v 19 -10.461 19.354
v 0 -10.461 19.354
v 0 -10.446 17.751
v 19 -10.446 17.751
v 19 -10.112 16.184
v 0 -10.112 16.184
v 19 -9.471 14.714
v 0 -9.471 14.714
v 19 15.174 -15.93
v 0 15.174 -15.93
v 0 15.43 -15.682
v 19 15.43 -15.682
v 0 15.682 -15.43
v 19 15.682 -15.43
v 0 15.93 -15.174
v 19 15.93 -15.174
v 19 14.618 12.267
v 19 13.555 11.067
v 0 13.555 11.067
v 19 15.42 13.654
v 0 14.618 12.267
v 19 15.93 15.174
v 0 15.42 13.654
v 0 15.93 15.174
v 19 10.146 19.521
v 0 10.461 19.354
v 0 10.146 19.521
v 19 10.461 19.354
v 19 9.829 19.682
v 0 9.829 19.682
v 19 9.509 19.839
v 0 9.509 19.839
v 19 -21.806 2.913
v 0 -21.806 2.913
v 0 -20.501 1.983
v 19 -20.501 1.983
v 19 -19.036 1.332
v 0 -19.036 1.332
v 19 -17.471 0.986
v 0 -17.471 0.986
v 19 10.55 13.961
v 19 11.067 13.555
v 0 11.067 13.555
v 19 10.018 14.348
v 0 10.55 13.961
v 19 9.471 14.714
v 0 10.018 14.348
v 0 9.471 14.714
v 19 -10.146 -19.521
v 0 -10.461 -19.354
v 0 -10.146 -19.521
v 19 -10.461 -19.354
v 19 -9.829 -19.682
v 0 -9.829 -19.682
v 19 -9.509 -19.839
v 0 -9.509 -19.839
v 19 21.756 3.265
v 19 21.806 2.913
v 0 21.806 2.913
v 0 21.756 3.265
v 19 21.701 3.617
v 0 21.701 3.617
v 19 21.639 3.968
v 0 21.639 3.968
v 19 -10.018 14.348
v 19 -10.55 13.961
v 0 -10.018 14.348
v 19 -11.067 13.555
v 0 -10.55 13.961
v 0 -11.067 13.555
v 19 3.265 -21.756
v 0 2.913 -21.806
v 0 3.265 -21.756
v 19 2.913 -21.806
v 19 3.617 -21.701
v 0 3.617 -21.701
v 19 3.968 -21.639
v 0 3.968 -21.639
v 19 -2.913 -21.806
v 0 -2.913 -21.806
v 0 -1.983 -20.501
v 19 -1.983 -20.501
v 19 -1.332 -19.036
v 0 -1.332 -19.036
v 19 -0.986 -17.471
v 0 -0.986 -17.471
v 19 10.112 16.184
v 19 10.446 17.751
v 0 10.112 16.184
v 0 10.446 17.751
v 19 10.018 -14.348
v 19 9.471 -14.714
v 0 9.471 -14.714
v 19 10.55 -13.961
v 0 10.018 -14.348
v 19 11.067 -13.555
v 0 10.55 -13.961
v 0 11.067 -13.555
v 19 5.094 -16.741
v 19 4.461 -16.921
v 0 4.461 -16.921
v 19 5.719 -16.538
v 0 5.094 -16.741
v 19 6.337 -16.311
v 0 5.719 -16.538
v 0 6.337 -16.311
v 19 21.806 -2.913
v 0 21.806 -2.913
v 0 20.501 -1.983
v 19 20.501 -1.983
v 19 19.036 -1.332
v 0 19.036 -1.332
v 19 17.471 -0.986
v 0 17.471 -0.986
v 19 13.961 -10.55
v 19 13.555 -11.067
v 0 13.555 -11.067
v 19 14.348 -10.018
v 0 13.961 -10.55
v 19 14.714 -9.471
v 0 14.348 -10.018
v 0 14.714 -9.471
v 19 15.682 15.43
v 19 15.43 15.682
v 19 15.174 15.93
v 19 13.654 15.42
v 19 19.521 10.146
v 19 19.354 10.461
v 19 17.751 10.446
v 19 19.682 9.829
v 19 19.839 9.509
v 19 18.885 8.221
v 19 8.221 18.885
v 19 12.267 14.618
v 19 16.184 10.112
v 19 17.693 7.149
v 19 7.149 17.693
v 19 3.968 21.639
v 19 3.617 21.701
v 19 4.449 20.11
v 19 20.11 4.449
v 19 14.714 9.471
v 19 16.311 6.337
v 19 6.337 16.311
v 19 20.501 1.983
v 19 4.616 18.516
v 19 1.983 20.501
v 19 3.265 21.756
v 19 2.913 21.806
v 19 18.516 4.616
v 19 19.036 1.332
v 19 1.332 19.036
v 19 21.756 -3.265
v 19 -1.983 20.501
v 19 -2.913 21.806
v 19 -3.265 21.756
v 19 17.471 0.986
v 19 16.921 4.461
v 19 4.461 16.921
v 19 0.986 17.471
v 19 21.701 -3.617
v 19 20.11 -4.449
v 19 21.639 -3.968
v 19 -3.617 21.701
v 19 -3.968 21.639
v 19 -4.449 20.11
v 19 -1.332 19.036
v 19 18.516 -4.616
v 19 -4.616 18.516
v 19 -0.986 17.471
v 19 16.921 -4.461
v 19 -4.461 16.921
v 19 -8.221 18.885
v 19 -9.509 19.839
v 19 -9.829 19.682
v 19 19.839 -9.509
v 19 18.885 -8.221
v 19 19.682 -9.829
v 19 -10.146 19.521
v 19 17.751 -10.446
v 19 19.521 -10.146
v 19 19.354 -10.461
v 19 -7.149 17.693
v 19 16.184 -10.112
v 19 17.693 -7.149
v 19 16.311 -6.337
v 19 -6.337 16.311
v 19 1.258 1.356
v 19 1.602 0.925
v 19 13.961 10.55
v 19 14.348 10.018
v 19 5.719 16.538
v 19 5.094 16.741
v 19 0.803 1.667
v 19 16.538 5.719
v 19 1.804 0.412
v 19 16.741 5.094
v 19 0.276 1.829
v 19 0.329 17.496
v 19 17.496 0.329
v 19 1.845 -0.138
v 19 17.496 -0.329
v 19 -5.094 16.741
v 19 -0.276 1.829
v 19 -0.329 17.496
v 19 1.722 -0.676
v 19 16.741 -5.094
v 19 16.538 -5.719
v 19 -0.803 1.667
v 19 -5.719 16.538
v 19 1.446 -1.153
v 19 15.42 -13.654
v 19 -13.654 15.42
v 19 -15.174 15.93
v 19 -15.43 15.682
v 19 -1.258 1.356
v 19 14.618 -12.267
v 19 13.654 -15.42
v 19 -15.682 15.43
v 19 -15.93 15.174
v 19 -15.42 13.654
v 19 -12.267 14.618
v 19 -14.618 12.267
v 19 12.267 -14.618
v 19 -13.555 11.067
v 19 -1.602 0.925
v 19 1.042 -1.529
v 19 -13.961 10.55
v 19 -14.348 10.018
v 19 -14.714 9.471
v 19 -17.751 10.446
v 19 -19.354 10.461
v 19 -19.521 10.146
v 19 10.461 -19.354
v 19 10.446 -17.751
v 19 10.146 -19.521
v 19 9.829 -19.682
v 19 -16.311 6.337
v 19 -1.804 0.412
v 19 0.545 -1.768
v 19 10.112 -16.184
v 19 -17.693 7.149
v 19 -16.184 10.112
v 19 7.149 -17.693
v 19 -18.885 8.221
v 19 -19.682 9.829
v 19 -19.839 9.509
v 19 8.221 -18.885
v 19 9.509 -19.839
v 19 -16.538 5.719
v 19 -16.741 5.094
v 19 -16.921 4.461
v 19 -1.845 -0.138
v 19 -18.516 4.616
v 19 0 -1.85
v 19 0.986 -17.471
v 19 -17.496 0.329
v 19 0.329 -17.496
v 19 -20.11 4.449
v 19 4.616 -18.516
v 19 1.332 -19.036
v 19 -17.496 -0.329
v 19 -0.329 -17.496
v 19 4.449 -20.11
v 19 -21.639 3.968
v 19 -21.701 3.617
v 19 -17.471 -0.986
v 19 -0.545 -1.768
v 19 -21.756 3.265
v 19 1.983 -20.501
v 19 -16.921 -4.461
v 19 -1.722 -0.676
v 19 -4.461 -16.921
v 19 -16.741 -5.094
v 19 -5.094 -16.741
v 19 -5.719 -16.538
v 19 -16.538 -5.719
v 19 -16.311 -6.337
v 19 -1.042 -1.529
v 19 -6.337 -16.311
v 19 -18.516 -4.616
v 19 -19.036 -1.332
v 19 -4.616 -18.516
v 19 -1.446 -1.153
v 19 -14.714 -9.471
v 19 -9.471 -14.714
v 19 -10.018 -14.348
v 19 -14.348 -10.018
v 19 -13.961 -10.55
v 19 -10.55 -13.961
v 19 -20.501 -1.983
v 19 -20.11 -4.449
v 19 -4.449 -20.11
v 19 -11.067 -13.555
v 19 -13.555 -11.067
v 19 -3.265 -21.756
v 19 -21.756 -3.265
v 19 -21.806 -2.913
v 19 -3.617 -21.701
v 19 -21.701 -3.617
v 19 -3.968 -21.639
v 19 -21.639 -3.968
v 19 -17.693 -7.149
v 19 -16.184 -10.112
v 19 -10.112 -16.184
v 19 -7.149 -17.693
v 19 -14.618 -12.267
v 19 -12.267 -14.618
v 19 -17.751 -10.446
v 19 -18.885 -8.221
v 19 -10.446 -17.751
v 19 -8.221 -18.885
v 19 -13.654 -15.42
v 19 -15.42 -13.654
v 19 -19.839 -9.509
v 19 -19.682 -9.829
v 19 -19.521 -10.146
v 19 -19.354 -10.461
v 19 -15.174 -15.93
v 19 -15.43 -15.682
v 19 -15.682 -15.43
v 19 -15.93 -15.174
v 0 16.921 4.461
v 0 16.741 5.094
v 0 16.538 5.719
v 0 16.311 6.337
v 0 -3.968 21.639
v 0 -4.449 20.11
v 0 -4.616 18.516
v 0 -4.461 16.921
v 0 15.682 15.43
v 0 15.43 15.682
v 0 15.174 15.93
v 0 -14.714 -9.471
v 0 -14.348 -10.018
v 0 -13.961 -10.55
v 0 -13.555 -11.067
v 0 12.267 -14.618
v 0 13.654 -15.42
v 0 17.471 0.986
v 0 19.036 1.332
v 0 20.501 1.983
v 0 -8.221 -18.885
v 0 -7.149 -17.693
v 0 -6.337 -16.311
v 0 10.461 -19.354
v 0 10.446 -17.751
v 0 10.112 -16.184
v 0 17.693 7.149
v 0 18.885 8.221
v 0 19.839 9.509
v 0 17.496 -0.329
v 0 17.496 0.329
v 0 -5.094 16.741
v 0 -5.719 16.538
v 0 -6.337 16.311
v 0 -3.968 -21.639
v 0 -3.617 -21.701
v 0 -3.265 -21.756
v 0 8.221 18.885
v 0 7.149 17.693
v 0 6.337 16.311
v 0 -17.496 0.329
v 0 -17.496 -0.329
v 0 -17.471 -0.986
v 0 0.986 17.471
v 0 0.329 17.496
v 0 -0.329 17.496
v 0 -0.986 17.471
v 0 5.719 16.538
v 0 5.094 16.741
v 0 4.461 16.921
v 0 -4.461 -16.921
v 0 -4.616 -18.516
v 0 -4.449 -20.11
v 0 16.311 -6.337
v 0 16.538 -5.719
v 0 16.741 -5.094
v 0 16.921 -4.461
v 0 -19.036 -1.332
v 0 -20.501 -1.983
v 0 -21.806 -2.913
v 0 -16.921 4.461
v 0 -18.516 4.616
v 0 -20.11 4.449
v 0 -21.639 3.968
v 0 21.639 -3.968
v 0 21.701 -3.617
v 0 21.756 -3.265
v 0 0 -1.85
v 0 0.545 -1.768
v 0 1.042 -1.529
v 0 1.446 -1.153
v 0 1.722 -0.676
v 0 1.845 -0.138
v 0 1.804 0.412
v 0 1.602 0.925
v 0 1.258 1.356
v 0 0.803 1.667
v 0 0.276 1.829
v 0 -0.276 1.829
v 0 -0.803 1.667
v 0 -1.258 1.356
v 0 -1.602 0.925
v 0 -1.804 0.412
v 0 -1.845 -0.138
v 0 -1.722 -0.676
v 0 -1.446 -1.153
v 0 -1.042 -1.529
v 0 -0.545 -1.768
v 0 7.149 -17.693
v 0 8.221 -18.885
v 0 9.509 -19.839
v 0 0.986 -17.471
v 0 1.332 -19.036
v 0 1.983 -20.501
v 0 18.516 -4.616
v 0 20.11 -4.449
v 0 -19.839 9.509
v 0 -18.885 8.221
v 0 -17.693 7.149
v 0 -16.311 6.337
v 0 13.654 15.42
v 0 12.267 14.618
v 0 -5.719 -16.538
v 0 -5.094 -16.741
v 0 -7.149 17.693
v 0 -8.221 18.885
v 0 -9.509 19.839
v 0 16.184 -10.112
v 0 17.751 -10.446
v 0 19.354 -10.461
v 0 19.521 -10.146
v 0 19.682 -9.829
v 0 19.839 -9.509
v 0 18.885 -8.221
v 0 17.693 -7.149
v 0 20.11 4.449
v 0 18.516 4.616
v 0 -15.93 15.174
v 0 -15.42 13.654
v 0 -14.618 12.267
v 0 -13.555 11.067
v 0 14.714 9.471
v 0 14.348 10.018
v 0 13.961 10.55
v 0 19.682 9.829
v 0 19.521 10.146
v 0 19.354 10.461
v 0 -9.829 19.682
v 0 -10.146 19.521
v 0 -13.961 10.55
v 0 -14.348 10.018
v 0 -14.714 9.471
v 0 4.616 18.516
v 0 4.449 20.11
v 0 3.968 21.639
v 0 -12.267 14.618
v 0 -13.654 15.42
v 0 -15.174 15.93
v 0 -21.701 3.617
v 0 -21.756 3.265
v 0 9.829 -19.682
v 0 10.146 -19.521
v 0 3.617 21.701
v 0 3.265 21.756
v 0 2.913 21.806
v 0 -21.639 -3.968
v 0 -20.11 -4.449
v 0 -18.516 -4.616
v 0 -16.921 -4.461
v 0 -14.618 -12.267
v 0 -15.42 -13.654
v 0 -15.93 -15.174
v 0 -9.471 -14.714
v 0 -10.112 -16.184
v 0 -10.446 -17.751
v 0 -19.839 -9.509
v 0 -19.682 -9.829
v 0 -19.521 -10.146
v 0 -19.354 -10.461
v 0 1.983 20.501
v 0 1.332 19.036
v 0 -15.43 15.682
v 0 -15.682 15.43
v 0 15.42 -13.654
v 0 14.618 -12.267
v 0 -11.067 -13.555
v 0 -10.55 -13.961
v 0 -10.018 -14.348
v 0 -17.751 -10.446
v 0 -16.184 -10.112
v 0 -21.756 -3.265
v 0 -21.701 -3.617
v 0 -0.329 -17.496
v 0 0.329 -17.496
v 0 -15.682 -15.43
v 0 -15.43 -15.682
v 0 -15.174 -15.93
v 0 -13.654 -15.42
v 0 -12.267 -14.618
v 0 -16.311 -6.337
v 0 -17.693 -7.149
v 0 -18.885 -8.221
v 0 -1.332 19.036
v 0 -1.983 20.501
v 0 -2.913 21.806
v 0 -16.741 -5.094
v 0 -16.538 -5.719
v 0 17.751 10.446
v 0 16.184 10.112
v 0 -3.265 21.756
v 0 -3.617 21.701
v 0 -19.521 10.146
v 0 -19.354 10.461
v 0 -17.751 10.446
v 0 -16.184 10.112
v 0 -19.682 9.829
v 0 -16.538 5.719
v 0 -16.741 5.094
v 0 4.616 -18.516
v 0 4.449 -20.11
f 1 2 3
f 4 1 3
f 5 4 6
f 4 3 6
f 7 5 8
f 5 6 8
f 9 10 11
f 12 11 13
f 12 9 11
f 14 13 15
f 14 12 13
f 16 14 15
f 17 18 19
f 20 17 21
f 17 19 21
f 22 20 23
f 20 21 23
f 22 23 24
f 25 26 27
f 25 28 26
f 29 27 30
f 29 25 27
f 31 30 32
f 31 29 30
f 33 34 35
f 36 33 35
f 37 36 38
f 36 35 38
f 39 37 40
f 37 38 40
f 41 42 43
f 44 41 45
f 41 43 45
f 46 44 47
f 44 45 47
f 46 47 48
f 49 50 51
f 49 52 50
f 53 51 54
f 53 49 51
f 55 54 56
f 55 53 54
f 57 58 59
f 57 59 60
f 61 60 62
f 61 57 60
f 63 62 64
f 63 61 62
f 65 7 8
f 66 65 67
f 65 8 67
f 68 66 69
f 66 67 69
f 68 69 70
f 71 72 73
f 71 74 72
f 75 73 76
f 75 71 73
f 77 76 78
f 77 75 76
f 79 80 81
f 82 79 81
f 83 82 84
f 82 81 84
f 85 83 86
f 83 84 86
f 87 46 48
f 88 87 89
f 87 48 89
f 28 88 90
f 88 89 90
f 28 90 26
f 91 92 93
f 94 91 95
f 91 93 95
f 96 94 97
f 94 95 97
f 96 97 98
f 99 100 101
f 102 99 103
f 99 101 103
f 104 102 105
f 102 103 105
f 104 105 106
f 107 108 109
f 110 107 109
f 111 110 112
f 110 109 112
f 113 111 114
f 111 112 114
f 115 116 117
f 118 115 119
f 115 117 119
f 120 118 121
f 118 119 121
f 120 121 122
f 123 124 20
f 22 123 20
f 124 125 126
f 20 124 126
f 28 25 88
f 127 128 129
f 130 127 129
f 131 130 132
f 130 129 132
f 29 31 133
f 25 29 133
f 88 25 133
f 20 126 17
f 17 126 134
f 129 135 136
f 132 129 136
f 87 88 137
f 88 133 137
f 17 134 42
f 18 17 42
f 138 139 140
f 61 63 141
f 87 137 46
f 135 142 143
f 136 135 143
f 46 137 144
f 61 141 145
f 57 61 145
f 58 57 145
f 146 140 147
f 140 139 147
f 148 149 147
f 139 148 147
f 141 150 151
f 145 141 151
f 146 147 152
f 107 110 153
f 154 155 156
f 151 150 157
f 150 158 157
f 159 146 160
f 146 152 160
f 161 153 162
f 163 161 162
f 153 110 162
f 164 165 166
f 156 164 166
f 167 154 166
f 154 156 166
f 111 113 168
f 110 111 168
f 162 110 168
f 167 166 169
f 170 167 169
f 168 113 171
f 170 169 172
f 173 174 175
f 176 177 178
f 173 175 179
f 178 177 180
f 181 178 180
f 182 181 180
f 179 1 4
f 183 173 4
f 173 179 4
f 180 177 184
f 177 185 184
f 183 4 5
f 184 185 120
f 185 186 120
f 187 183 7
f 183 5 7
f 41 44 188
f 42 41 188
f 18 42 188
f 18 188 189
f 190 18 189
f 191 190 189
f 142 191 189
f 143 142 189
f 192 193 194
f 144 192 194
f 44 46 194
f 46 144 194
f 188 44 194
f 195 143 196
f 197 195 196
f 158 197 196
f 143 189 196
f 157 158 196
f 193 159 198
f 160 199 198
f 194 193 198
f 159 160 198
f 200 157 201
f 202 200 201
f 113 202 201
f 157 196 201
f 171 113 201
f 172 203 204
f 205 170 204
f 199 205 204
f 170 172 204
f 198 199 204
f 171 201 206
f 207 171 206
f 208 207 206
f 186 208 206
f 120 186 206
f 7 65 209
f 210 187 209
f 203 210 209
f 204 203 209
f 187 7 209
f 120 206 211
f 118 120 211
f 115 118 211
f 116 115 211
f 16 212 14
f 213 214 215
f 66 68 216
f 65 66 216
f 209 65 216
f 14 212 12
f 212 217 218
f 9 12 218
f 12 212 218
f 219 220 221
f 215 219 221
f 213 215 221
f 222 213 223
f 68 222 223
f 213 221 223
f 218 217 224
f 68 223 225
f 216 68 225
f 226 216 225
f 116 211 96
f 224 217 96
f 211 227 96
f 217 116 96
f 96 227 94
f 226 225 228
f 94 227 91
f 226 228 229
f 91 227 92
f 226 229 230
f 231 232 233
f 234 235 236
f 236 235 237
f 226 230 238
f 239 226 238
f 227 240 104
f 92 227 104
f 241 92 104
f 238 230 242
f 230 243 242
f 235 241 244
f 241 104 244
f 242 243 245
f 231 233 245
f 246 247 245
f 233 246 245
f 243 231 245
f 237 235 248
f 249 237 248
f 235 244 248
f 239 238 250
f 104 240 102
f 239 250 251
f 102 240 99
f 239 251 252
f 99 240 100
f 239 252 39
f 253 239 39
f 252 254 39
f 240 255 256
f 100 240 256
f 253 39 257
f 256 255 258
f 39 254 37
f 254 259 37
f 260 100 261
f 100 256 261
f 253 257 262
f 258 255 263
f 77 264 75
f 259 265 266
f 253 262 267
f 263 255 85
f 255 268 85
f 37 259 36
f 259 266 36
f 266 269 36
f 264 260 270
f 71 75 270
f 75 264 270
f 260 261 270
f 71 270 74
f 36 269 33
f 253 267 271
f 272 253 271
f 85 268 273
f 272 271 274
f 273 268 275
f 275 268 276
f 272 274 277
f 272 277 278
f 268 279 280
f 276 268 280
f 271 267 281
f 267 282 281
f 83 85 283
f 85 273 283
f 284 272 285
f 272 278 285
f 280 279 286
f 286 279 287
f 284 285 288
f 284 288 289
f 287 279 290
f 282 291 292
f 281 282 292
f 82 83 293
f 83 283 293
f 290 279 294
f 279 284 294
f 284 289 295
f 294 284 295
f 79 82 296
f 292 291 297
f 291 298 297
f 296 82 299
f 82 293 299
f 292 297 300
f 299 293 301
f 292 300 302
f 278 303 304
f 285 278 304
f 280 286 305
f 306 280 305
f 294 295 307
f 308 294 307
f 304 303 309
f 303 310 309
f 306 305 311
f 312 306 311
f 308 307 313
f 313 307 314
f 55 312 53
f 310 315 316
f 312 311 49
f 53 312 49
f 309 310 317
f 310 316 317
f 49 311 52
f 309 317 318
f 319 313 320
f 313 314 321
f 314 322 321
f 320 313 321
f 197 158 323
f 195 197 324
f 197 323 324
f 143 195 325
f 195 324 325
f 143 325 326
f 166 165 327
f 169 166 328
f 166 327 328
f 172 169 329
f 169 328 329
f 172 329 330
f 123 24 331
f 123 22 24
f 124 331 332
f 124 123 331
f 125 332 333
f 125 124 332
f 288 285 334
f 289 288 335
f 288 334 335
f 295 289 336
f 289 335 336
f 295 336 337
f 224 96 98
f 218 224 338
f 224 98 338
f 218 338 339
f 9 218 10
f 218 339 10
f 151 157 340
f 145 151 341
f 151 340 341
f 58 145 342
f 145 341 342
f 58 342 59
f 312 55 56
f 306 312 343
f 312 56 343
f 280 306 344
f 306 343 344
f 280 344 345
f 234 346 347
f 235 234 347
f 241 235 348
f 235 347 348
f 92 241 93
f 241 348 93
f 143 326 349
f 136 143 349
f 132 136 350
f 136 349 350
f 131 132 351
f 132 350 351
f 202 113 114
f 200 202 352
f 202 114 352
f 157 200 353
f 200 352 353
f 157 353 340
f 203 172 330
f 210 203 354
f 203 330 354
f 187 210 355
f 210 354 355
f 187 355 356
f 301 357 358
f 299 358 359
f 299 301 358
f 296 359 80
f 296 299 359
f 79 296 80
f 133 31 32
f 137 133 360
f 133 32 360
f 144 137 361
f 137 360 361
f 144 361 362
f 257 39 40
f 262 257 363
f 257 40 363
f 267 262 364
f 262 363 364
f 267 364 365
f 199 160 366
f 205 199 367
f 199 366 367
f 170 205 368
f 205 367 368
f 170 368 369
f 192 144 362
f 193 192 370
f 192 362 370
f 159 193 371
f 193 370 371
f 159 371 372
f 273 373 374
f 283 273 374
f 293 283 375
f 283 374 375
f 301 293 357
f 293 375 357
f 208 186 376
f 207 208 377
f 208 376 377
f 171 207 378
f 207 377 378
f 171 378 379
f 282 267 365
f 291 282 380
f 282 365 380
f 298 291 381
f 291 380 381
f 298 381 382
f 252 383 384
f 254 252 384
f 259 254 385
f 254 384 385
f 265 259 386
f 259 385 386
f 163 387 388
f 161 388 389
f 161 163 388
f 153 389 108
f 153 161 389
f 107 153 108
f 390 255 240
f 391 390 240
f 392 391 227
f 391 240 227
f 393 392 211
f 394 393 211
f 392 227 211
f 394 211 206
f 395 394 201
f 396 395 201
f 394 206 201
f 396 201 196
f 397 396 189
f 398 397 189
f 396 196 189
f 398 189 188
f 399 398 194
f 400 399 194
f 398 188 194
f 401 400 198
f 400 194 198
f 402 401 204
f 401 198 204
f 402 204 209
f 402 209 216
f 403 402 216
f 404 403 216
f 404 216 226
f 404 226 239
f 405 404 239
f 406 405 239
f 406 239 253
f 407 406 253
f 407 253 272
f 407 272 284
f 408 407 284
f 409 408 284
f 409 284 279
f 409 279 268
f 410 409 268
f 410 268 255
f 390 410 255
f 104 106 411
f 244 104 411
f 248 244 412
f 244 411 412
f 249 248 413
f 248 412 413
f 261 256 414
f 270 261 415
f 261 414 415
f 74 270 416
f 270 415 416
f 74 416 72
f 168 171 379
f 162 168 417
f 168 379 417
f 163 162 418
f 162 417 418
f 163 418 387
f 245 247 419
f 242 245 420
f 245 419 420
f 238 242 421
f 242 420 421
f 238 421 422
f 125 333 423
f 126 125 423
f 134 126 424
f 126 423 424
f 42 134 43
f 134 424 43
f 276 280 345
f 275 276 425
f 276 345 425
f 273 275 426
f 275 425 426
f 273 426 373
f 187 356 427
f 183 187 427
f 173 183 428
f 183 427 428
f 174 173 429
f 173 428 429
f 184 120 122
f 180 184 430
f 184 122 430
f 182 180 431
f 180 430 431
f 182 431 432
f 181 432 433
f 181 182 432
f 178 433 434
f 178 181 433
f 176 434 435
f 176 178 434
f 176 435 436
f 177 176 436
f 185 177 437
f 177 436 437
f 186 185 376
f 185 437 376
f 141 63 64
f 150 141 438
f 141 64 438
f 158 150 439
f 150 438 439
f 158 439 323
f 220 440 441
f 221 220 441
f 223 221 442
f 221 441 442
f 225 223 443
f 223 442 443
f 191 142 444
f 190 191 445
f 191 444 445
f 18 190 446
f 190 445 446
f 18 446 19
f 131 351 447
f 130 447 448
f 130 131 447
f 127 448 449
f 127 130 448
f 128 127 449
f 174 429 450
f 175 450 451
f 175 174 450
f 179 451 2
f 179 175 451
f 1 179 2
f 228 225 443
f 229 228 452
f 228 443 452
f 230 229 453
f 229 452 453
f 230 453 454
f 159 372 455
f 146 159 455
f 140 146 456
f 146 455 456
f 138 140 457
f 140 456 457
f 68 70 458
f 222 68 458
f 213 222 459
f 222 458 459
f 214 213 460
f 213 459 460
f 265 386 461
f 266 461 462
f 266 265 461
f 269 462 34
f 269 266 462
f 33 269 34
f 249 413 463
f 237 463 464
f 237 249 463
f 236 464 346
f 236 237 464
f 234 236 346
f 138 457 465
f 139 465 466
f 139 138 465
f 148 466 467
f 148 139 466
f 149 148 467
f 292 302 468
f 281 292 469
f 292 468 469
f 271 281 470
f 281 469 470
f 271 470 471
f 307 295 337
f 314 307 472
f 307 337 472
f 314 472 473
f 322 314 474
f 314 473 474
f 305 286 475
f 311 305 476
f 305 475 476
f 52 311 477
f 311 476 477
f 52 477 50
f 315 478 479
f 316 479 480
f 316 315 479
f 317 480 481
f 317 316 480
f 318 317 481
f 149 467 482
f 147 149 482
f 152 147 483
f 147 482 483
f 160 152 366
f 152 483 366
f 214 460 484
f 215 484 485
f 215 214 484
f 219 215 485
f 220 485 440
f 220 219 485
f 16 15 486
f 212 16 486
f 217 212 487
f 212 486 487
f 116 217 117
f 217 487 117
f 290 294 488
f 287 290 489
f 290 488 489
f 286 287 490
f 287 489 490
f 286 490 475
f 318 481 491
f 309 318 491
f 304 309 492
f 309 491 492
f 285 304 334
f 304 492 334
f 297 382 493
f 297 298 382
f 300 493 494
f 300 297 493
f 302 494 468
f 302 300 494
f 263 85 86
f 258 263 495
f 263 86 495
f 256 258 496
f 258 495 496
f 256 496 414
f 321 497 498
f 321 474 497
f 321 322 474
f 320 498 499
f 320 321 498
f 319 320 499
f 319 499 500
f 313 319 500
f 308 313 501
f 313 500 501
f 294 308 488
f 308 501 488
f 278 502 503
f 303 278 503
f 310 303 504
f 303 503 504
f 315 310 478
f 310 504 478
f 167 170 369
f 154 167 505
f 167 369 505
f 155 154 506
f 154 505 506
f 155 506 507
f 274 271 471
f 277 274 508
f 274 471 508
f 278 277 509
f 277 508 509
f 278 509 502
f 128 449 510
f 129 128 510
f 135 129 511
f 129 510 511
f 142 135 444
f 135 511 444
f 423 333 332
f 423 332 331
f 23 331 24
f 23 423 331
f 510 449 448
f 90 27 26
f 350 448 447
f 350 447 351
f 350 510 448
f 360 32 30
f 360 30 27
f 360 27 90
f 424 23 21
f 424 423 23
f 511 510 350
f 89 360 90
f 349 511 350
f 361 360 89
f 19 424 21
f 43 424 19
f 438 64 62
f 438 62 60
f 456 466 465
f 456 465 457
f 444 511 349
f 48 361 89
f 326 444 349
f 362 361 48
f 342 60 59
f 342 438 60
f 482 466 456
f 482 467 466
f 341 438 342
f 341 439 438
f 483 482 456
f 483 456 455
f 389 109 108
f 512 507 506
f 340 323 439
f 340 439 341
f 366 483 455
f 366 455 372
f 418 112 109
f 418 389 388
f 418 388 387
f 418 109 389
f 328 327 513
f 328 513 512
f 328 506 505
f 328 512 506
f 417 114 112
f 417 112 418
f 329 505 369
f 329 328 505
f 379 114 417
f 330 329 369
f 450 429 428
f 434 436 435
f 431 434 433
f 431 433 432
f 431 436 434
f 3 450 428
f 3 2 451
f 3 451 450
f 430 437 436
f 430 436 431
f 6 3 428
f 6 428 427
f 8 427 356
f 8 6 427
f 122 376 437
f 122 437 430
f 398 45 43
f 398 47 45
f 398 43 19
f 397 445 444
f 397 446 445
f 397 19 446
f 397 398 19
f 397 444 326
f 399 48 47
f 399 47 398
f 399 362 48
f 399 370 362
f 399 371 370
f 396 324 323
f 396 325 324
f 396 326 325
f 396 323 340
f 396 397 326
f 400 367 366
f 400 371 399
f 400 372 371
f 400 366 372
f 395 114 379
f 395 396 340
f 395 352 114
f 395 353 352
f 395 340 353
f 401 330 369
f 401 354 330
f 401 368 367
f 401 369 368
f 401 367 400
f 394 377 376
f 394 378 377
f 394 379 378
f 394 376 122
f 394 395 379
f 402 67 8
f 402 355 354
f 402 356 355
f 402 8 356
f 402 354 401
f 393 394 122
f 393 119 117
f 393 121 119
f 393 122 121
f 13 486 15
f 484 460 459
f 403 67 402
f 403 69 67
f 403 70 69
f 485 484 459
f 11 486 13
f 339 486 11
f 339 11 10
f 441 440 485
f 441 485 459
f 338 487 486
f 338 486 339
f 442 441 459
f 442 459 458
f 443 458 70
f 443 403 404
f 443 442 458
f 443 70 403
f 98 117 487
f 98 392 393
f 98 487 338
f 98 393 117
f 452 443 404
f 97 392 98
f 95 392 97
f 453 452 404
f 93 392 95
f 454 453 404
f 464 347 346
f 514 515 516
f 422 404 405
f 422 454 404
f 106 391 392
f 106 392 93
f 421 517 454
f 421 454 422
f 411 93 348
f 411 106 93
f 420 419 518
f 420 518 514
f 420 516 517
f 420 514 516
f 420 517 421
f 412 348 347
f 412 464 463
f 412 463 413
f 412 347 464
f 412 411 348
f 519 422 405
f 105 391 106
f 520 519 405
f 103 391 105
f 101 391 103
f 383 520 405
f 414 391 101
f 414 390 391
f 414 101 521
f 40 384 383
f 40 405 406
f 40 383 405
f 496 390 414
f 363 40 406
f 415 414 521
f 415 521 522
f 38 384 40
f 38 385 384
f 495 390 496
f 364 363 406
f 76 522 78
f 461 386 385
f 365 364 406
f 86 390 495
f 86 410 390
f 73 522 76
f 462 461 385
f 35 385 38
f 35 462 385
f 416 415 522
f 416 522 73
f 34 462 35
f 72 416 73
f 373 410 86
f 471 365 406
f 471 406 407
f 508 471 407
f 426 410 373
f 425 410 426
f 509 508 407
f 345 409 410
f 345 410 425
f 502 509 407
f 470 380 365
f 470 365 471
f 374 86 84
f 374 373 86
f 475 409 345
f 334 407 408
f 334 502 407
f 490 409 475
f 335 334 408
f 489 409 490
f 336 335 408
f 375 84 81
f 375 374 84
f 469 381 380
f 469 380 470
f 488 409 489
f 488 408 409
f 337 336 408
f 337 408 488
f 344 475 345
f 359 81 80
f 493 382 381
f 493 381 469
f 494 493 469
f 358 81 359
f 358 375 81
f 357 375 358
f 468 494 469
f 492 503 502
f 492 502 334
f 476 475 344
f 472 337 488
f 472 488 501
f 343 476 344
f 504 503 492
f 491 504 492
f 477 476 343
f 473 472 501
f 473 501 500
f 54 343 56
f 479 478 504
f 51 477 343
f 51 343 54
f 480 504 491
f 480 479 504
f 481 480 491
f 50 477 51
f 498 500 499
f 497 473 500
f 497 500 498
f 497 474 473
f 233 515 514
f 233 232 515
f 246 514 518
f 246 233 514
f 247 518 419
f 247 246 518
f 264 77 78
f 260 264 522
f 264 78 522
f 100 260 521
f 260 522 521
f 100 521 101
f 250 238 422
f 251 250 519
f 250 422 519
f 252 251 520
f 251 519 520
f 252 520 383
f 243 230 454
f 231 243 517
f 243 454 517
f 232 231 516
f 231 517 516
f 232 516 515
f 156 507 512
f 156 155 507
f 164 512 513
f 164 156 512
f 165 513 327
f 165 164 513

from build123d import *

# Parameters (mm, degrees)
BASPROSKE_W        = 19
BASPROSKE_H        = 22
TOOTHCUT_DEPTH     = 37.455452267
TEETHCUTS_COUNT    = 20
TEETHCUTS_ANGLE    = 342
SKETCH1_R          = 1.85
CUT_EXTRUDE1_DEPTH = 37.221987796


with BuildPart() as part:
    # BasProSke → Base-Revolve (revolve)
    with BuildSketch(Plane(origin=(0, 0, 0), x_dir=(1, 0, 0), z_dir=(0, 1, 0)), mode=Mode.PRIVATE) as base_revolve_sk:
        with Locations((9.5, 11)):
            Rectangle(BASPROSKE_W, BASPROSKE_H)
    revolve(base_revolve_sk.sketch.rotate(Axis((-10, 0, 0), (1, 0, 0)), 180), axis=Axis((-10, 0, 0), (1, 0, 0)))

    # TooCutSke → ToothCut (cut, through all)
    with BuildSketch(Plane(origin=(0, 0, 0), x_dir=(0, 0, -1), z_dir=(1, 0, 0))):
        with BuildLine():
            ThreePointArc((0.986171591, 17.471189616), (0, 17.499), (-0.986171591, 17.471189616))
            ThreePointArc((-0.986171591, 17.471189616), (-1.626916196, 19.798789858), (-2.932850173, 21.829260982))
            ThreePointArc((-2.932850173, 21.829260982), (0, 22.0254), (2.932850173, 21.829260982))
            ThreePointArc((2.932850173, 21.829260982), (1.626916196, 19.798789858), (0.986171591, 17.471189616))
        make_face()
    toothcut = extrude(amount=TOOTHCUT_DEPTH, mode=Mode.SUBTRACT)

    # TeethCuts: ToothCut ×20 about axis
    teethcuts_axis = Axis((-10, 0, 0), (1, 0, 0))
    for i in range(1, TEETHCUTS_COUNT):
        add(toothcut.rotate(teethcuts_axis, i * TEETHCUTS_ANGLE / (TEETHCUTS_COUNT - 1)), mode=Mode.SUBTRACT)

    # Sketch1 → Cut-Extrude1 (cut, through all)
    with BuildSketch(Plane(origin=(19, 0, 0), x_dir=(0, 0, -1), z_dir=(1, 0, 0))):
        Circle(SKETCH1_R)
    extrude(amount=-CUT_EXTRUDE1_DEPTH, mode=Mode.SUBTRACT)


solid = part.part
